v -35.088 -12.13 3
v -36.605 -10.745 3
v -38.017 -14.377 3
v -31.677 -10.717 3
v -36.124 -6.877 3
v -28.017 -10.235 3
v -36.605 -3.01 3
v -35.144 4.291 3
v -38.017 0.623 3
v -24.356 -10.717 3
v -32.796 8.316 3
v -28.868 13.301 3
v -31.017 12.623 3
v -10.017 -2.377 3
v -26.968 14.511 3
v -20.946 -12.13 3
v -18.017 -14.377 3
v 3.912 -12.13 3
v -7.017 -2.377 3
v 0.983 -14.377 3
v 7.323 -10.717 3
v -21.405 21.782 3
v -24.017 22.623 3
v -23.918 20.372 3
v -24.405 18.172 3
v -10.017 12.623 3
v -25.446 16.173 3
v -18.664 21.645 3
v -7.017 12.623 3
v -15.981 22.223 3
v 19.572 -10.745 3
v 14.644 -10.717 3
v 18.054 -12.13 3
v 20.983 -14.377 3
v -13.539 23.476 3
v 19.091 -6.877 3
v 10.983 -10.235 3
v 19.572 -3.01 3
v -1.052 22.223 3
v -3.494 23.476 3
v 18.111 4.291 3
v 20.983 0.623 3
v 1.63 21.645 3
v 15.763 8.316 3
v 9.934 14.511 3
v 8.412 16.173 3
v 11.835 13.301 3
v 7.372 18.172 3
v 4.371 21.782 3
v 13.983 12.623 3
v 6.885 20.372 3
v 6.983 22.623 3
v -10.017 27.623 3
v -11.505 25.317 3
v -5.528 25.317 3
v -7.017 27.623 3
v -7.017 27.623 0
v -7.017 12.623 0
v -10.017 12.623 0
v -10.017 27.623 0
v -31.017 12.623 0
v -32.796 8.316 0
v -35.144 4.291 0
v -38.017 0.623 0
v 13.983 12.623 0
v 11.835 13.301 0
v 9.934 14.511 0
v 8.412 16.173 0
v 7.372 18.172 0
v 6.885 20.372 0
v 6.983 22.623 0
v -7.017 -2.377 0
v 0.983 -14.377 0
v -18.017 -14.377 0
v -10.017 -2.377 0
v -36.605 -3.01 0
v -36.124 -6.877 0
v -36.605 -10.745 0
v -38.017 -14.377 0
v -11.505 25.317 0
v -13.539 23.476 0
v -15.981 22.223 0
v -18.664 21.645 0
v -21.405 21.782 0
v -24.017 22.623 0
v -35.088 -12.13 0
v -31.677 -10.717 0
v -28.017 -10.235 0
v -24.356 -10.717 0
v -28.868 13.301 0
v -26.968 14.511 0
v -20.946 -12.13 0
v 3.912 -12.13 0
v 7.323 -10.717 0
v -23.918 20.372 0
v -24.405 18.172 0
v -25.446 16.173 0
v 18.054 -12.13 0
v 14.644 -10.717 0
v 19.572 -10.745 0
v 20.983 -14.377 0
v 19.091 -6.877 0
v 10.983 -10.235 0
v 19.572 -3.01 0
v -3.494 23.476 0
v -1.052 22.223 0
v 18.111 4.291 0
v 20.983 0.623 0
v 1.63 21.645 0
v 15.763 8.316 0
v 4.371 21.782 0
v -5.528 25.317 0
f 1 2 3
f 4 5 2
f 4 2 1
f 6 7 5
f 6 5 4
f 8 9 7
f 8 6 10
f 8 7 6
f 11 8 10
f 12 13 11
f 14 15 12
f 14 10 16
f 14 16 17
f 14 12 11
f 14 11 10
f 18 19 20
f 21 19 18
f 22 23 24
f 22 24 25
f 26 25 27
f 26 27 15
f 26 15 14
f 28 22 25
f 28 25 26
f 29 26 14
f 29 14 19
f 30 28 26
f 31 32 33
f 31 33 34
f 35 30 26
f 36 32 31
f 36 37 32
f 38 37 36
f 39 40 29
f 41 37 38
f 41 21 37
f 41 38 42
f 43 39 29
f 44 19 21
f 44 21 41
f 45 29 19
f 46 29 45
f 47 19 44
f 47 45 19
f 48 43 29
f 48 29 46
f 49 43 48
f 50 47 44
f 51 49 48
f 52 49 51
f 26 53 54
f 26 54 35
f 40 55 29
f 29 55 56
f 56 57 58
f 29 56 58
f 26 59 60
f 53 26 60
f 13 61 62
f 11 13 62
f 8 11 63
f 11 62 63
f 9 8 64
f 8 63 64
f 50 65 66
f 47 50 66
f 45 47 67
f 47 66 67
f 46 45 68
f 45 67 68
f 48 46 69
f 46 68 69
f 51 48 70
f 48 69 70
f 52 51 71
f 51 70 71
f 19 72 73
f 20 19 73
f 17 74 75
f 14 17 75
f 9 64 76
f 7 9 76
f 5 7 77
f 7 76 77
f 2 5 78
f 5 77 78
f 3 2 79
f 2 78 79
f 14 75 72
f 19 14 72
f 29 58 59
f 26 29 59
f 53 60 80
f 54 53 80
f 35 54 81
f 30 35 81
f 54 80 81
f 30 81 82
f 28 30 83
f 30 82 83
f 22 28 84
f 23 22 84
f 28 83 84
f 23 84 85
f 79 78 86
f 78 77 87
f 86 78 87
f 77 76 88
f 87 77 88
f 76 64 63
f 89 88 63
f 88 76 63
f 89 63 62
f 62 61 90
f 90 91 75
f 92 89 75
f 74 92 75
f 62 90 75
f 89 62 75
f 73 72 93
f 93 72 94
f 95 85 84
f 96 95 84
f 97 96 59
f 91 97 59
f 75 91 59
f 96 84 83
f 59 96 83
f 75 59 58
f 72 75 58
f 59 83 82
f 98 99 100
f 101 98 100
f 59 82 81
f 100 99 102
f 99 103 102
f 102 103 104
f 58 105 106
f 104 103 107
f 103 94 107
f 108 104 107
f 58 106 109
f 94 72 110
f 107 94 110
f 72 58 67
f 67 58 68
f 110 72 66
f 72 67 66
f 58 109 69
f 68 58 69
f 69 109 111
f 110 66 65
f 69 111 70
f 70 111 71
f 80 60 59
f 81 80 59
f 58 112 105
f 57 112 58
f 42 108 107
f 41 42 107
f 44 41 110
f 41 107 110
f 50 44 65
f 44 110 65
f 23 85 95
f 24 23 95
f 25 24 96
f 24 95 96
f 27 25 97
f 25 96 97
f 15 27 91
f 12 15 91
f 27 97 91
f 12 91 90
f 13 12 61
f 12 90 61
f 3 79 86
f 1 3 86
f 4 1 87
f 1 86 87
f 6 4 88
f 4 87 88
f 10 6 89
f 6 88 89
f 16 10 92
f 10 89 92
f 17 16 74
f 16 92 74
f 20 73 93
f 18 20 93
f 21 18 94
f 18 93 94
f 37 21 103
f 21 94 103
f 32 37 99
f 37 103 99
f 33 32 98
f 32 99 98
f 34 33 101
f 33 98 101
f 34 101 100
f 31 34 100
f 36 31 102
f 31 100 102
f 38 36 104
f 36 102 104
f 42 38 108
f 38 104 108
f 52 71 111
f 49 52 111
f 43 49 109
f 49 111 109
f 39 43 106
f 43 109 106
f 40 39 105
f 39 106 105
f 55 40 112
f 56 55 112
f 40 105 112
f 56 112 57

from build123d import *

# Parameters (mm, degrees)
SALIENTE_EXTRUIR2_DEPTH = 3


with BuildPart() as part:
    # Croquis1 → Saliente-Extruir2 (new body)
    with BuildSketch(Plane.XY):
        with BuildLine():
            Line((-7.016617782, 12.62270249), (-10.016617782, 12.62270249))
            Line((-10.016617782, 12.62270249), (-10.016617782, 27.62270249))
            ThreePointArc((-10.016617782, 27.62270249), (-15.981083876, 22.223207554), (-24.016617782, 22.62270249))
            ThreePointArc((-24.016617782, 22.62270249), (-25.44554997, 16.172955022), (-31.016617782, 12.62270249))
            ThreePointArc((-31.016617782, 12.62270249), (-33.901410943, 6.263831835), (-38.016617782, 0.62270249))
            ThreePointArc((-38.016617782, 0.62270249), (-36.124451454, -6.87729751), (-38.016617782, -14.37729751))
            ThreePointArc((-38.016617782, -14.37729751), (-28.016617782, -10.235161886), (-18.016617782, -14.37729751))
            Line((-18.016617782, -14.37729751), (-10.016617782, -2.37729751))
            Line((-10.016617782, -2.37729751), (-7.016617782, -2.37729751))
            Line((-7.016617782, -2.37729751), (0.983382218, -14.37729751))
            ThreePointArc((0.983382218, -14.37729751), (10.983382218, -10.235161886), (20.983382218, -14.37729751))
            ThreePointArc((20.983382218, -14.37729751), (19.09121589, -6.87729751), (20.983382218, 0.62270249))
            ThreePointArc((20.983382218, 0.62270249), (16.868175379, 6.263831835), (13.983382218, 12.62270249))
            ThreePointArc((13.983382218, 12.62270249), (8.412314406, 16.172955022), (6.983382218, 22.62270249))
            ThreePointArc((6.983382218, 22.62270249), (-1.052151688, 22.223207554), (-7.016617782, 27.62270249))
            Line((-7.016617782, 27.62270249), (-7.016617782, 12.62270249))
        make_face()
    extrude(amount=SALIENTE_EXTRUIR2_DEPTH)


solid = part.part
